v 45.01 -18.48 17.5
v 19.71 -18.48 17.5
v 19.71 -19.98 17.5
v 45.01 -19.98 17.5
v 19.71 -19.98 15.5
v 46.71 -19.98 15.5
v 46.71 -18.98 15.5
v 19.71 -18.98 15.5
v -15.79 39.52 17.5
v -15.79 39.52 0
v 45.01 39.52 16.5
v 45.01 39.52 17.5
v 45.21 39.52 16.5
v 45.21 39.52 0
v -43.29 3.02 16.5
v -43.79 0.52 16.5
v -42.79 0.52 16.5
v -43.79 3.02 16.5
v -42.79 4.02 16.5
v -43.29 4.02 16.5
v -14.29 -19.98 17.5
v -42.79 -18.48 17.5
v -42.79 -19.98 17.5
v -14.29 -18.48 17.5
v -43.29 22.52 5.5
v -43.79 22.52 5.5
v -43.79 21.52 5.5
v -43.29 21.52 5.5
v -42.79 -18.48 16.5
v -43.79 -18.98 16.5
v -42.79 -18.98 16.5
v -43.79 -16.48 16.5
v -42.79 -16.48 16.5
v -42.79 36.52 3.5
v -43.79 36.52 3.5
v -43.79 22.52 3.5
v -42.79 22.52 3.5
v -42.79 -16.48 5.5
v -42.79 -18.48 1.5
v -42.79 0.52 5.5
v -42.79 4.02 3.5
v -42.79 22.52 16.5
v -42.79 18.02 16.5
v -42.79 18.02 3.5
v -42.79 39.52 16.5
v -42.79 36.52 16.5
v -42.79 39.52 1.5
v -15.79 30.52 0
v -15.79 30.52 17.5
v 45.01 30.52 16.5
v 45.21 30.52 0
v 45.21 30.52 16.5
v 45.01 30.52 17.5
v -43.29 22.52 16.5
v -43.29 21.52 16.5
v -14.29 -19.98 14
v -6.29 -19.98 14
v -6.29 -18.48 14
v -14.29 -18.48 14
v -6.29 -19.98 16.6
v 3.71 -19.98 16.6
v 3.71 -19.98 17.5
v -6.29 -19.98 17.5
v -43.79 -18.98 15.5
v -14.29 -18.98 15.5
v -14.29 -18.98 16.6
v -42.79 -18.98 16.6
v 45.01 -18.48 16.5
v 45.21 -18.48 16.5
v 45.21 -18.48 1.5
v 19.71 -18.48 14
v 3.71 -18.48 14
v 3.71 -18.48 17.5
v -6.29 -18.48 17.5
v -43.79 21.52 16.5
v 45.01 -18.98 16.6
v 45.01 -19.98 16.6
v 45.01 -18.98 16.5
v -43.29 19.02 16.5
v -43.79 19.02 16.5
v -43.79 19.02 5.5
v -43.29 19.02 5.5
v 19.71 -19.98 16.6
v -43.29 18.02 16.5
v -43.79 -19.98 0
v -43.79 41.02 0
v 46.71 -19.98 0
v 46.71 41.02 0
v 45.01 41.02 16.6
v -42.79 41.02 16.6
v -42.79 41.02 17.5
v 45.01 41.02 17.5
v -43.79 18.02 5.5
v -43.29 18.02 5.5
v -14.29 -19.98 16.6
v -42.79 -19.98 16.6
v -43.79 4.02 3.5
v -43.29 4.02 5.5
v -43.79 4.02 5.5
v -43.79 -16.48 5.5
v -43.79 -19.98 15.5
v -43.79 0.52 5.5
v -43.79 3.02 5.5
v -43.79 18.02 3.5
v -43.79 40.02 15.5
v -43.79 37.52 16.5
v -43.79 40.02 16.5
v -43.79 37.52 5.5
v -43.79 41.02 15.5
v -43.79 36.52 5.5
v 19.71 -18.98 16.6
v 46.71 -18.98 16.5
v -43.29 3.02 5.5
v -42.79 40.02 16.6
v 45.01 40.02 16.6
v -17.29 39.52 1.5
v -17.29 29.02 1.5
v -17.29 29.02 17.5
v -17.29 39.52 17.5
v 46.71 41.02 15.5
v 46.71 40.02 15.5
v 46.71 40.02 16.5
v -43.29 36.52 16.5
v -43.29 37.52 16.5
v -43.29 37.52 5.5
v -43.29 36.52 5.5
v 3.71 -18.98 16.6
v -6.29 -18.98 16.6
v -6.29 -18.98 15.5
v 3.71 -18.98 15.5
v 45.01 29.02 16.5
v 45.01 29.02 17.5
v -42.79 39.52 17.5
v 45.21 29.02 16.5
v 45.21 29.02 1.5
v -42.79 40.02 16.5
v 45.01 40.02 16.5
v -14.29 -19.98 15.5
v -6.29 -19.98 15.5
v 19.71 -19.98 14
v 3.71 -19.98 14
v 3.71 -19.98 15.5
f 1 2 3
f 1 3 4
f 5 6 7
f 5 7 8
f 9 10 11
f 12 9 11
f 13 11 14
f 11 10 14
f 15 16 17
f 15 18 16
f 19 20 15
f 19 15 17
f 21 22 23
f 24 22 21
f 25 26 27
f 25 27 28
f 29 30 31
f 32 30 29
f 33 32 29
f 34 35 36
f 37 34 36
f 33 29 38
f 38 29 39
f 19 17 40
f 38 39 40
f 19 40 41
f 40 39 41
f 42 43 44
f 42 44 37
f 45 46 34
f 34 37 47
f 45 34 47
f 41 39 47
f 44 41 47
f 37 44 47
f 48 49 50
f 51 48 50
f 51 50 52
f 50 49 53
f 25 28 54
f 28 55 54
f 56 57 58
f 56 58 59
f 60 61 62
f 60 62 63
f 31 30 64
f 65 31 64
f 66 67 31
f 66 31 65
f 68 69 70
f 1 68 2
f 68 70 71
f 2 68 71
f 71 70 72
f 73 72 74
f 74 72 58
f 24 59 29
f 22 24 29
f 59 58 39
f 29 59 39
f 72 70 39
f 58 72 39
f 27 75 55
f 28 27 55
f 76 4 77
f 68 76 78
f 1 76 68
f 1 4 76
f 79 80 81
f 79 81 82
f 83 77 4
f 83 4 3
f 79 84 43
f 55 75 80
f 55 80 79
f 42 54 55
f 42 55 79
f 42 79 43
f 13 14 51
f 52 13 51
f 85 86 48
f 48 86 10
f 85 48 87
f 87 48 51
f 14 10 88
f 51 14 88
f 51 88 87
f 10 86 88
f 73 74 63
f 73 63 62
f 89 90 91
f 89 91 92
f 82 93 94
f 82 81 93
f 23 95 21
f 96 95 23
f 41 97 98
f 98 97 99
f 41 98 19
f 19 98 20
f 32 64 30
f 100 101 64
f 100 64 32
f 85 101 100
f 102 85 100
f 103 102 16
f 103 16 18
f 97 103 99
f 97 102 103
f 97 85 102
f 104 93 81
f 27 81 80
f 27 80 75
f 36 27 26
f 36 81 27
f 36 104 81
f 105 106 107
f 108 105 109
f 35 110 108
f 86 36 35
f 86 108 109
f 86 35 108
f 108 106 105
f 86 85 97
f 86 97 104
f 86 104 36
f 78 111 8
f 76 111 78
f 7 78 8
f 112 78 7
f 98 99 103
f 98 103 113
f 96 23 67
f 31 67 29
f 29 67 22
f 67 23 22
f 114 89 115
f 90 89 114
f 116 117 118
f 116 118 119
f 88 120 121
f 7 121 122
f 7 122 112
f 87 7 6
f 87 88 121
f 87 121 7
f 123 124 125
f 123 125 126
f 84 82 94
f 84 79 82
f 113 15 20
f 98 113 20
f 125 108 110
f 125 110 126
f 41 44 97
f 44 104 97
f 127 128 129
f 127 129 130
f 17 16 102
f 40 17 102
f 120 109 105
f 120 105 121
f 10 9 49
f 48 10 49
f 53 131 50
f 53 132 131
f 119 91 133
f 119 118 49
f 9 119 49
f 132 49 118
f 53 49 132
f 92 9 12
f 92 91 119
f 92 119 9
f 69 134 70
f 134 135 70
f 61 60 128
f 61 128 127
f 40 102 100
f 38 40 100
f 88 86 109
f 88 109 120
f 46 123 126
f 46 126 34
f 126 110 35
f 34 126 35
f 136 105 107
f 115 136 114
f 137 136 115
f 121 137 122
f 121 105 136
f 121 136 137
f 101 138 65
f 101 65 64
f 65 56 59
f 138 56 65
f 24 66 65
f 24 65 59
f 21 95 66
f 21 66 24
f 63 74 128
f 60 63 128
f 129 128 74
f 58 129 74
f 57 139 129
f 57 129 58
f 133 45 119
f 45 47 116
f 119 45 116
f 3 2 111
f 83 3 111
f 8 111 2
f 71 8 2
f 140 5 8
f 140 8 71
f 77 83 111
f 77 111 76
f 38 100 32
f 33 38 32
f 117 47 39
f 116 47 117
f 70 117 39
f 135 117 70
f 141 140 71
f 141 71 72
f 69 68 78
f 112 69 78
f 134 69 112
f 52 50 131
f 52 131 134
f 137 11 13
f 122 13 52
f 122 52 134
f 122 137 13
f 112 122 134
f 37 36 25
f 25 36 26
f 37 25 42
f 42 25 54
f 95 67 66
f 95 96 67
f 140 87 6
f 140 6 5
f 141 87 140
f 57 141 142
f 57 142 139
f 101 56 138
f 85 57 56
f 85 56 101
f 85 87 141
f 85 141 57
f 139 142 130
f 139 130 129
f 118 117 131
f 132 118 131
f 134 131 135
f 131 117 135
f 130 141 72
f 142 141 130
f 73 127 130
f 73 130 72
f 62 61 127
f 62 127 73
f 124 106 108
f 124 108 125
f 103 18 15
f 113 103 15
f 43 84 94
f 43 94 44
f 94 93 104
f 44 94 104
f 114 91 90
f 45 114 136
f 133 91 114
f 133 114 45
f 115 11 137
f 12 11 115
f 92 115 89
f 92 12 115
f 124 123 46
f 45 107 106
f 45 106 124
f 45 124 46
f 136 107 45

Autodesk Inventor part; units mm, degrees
ref_plane "YZ Plane" through (0, 0, 0) normal (1, 0, 0) x (0, 1, 0)
ref_plane "XZ Plane" through (0, 0, 0) normal (0, 1, 0) x (-1, 0, 0)
ref_plane "XY Plane" through (0, 0, 0) normal (0, 0, 1) x (1, 0, 0)
sketch "Sketch1" plane through (0, 0, 0) normal (0, 0, 1) x (1, 0, 0)
  line L0 (-43.7903, 41.0199) -> (46.7097, 41.0199)
  line L1 (46.7097, 41.0199) -> (46.7097, -19.9801)
  line L2 (46.7097, -19.9801) -> (-43.7903, -19.9801)
  line L3 (-43.7903, -19.9801) -> (-43.7903, 41.0199)
  point P0 (0, 0)
  dimension "d0" = 90.5
  dimension "d1" = 61
extrude "Extrusion1" add sketch "Sketch1" along normal blind 1.5
sketch "Sketch2" plane through (0, 0, 1.5) normal (0, 0, 1) x (1, 0, 0)
  line L0 (-42.7903, 39.5199) -> (45.2097, 39.5199)
  line L1 (45.2097, 39.5199) -> (45.2097, -18.4801)
  line L2 (45.2097, -18.4801) -> (-42.7903, -18.4801)
  line L3 (-42.7903, -18.4801) -> (-42.7903, 39.5199)
  line L4 (-43.7903, 41.0199) -> (46.7097, 41.0199)
  line L5 (46.7097, 41.0199) -> (46.7097, -19.9801)
  line L6 (46.7097, -19.9801) -> (-43.7903, -19.9801)
  line L7 (-43.7903, -19.9801) -> (-43.7903, 41.0199)
  point P0 (0, 0)
  dimension "d4" = 1.5
  dimension "d5" = 1.5
  dimension "d6" = 1.5
  dimension "d7" = 1
extrude "Extrusion2" add sketch "Sketch2" along normal blind 16
sketch "Sketch3" plane through (-43.7903, -19.9801, 0) normal (-1, 0, 0) x (0, 0, 1)
  line L0 (17.5, 1.5) -> (17.5, 59.5) projected
  line L1 (17.5, 20.5) -> (5.5, 20.5)
  line L2 (5.5, 20.5) -> (5.5, 3.5)
  line L3 (5.5, 3.5) -> (17.5, 3.5)
  line L4 (17.5, 3.5) -> (17.5, 20.5)
  line L5 (17.5, 38) -> (3.5, 38)
  line L6 (3.5, 38) -> (3.5, 24)
  line L7 (3.5, 24) -> (17.5, 24)
  line L8 (17.5, 24) -> (17.5, 38)
  line L9 (17.5, 56.5) -> (3.5, 56.5)
  line L10 (3.5, 56.5) -> (3.5, 42.5)
  line L11 (3.5, 42.5) -> (17.5, 42.5)
  line L12 (17.5, 42.5) -> (17.5, 56.5)
  line L13 (0, 0) -> (17.5, 0) projected
  point P0 (0, 19.9801)
  dimension "d10" = 3.5
  dimension "d11" = 12
  dimension "d12" = 17
  dimension "d13" = 3.5
  dimension "d14" = 14
  dimension "d15" = 14
  dimension "d16" = 14
  dimension "d17" = 4.5
  dimension "d18" = 14
extrude "Extrusion3" cut sketch "Sketch3" against normal blind 1
sketch "Sketch4" plane through (0, 0, 1.5) normal (0, 0, 1) x (1, 0, 0)
  line L0 (45.2097, 39.5199) -> (-15.7903, 39.5199)
  line L1 (-15.7903, 39.5199) -> (-15.7903, 30.5199)
  line L2 (-15.7903, 30.5199) -> (45.2097, 30.5199)
  line L3 (45.2097, 30.5199) -> (45.2097, 39.5199)
  point P0 (0, 0)
  dimension "d21" = 61
  dimension "d22" = 9
extrude "Extrusion4" cut sketch "Sketch4" against normal blind 1.5
sketch "Sketch5" plane through (0, 0, 1.5) normal (0, 0, 1) x (1, 0, 0)
  line L0 (45.2097, 30.5199) -> (-15.7903, 30.5199)
  line L1 (-15.7903, 30.5199) -> (-15.7903, 29.0199)
  line L2 (-15.7903, 29.0199) -> (45.2097, 29.0199)
  line L3 (45.2097, 29.0199) -> (45.2097, 30.5199)
  line L4 (-42.7903, 39.5199) -> (45.2097, 39.5199) projected
  line L5 (-15.7903, 29.0199) -> (-17.2903, 29.0199)
  line L6 (-17.2903, 29.0199) -> (-17.2903, 39.5199)
  line L7 (-17.2903, 39.5199) -> (-15.7903, 39.5199)
  line L8 (-15.7903, 39.5199) -> (-15.7903, 29.0199)
  line L9 (46.7097, 41.0199) -> (46.7097, -19.9801) projected
  line L10 (45.2097, -18.4801) -> (45.2097, 30.5199) projected
  point P0 (0, 0)
  dimension "d25" = 1.5
  dimension "d26" = 1.5
  dimension "d28" = 61
  dimension "d29" = 9
extrude "Extrusion5" add sketch "Sketch5" along normal blind 16
sketch "Sketch6" plane through (0, 0, 17.5) normal (0, 0, 1) x (1, 0, 0)
  line L0 (-43.7903, 0.5199) -> (-42.7903, 0.5199) projected
  line L1 (-42.7903, 4.0199) -> (-43.7903, 4.0199) projected
  line L2 (-42.7903, 0.5199) -> (-42.7903, 4.0199) projected
  line L3 (-43.7903, 4.0199) -> (-43.7903, 0.5199) projected
  line L4 (-43.7903, -19.9801) -> (-43.7903, 41.0199) projected
  line L5 (-43.2903, 4.0199) -> (-43.7903, 4.0199)
  line L6 (-43.7903, 4.0199) -> (-43.7903, 3.0199)
  line L7 (-43.7903, 3.0199) -> (-43.2903, 3.0199)
  line L8 (-43.2903, 3.0199) -> (-43.2903, 4.0199)
  point P0 (0, 0)
  dimension "d32" = 3.5
  dimension "d33" = 1
  dimension "d34" = 0.5
  dimension "d35" = 1
extrude "Extrusion6" cut sketch "Sketch6" against normal blind 12 contours L3 L1 L8 L7
sketch "Sketch7" plane through (0, 0, 17.5) normal (0, 0, 1) x (1, 0, 0)
  line L0 (-43.7903, 18.0199) -> (-42.7903, 18.0199) projected
  line L1 (-43.7903, 22.5199) -> (-43.7903, 18.0199) projected
  line L2 (-43.2903, 18.0199) -> (-43.7903, 18.0199)
  line L3 (-43.7903, 18.0199) -> (-43.7903, 19.0199)
  line L4 (-43.7903, 19.0199) -> (-43.2903, 19.0199)
  line L5 (-43.2903, 19.0199) -> (-43.2903, 18.0199)
  point P0 (0, 0)
  dimension "d38" = 1
extrude "Extrusion7" cut sketch "Sketch7" against normal blind 12
sketch "Sketch8" plane through (0, 0, 17.5) normal (0, 0, 1) x (1, 0, 0)
  line L0 (-43.7903, 22.5199) -> (-43.7903, 19.0199) projected
  line L1 (-43.2903, 22.5199) -> (-43.7903, 22.5199)
  line L2 (-43.7903, 22.5199) -> (-43.7903, 21.5199)
  line L3 (-43.7903, 21.5199) -> (-43.2903, 21.5199)
  line L4 (-43.2903, 21.5199) -> (-43.2903, 22.5199)
  line L5 (-42.7903, 22.5199) -> (-43.7903, 22.5199) projected
  point P0 (0, 0)
  dimension "d41" = 0.5
  dimension "d42" = 1
  dimension "d43" = 1
extrude "Extrusion8" cut sketch "Sketch8" against normal blind 12
sketch "Sketch9" plane through (0, 0, 17.5) normal (0, 0, 1) x (1, 0, 0)
  line L0 (-43.7903, 36.5199) -> (-42.7903, 36.5199) projected
  line L1 (-43.7903, 41.0199) -> (-43.7903, 36.5199) projected
  line L2 (-43.2903, 36.5199) -> (-43.7903, 36.5199)
  line L3 (-43.7903, 36.5199) -> (-43.7903, 37.5199)
  line L4 (-43.7903, 37.5199) -> (-43.2903, 37.5199)
  line L5 (-43.2903, 37.5199) -> (-43.2903, 36.5199)
  point P0 (0, 0)
  dimension "d46" = 1
  dimension "d47" = 0.5
extrude "Extrusion9" cut sketch "Sketch9" against normal blind 12
sketch "Sketch10" plane through (-43.7903, -19.9801, 0) normal (0, -1, 0) x (1, 0, 0)
  line L0 (29.5, 17.5) -> (37.5, 17.5)
  line L1 (37.5, 17.5) -> (37.5, 14)
  line L2 (37.5, 14) -> (29.5, 14)
  line L3 (29.5, 14) -> (29.5, 17.5)
  line L4 (0, 0) -> (0, 17.5) projected
  line L5 (47.5, 17.5) -> (63.5, 17.5)
  line L6 (63.5, 17.5) -> (63.5, 14)
  line L7 (63.5, 14) -> (47.5, 14)
  line L8 (47.5, 14) -> (47.5, 17.5)
  line L9 (90.5, 0) -> (90.5, 17.5) projected
  point P0 (43.7903, 0)
  dimension "d50" = 29.5
  dimension "d51" = 8
  dimension "d53" = 16
  dimension "d57" = 10
extrude "Extrusion10" cut sketch "Sketch10" against normal blind 1.5
sketch "Sketch11" plane through (-43.7903, -19.9801, 0) normal (0, -1, 0) x (1, 0, 0)
  line L0 (63.5, 17.5) -> (63.5, 14) projected
  line L1 (90.5, 0) -> (90.5, 17.5) projected
  line L2 (63.5, 16.6) -> (90.5, 16.6)
  line L3 (90.5, 16.6) -> (90.5, 15.5)
  line L4 (90.5, 15.5) -> (63.5, 15.5)
  line L5 (63.5, 15.5) -> (63.5, 16.6)
  line L6 (37.5, 17.5) -> (37.5, 14) projected
  line L7 (47.5, 14) -> (47.5, 17.5) projected
  line L8 (37.5, 16.6) -> (47.5, 16.6)
  line L9 (47.5, 16.6) -> (47.5, 15.5)
  line L10 (47.5, 15.5) -> (37.5, 15.5)
  line L11 (37.5, 15.5) -> (37.5, 16.6)
  line L12 (0, 0) -> (0, 17.5) projected
  line L13 (29.5, 14) -> (29.5, 17.5) projected
  line L14 (0, 16.6) -> (29.5, 16.6)
  line L15 (29.5, 16.6) -> (29.5, 15.5)
  line L16 (29.5, 15.5) -> (0, 15.5)
  line L17 (0, 15.5) -> (0, 16.6)
  line L18 (63.5, 17.5) -> (90.5, 17.5) projected
  line L19 (37.5, 17.5) -> (47.5, 17.5) projected
  line L20 (0, 17.5) -> (29.5, 17.5) projected
  point P0 (43.7903, 0)
  dimension "d61" = 1.1
  dimension "d62" = 0.9
  dimension "d63" = 1.1
  dimension "d64" = 0.9
  dimension "d65" = 1.1
  dimension "d66" = 0.9
extrude "Extrusion11" cut sketch "Sketch11" against normal blind 1 contours L2 L1 L4 L0 | L8 L7 L10 L6 | L12 L14 L13 L16
sketch "Sketch12" plane through (-43.7903, 41.0199, 0) normal (0, 1, 0) x (1, 0, 0)
  line L0 (90.5, 0) -> (90.5, -17.5) projected
  line L1 (0, 0) -> (0, -17.5) projected
  line L2 (90.5, -16.6) -> (0, -16.6)
  line L3 (0, -16.6) -> (0, -15.5)
  line L4 (0, -15.5) -> (90.5, -15.5)
  line L5 (90.5, -15.5) -> (90.5, -16.6)
  line L6 (90.5, -17.5) -> (0, -17.5) projected
  point P0 (43.7903, 0)
  dimension "d69" = 1.1
  dimension "d70" = 0.9
extrude "Extrusion12" cut sketch "Sketch12" against normal blind 1 contours L0 L2 L1 L4
sketch "Sketch13" plane through (0, 0, 17.5) normal (0, 0, 1) x (1, 0, 0)
  line L0 (-42.7903, -16.4801) -> (-43.7903, -16.4801)
  line L1 (-43.7903, -16.4801) -> (-43.7903, -19.9801)
  line L2 (-43.7903, -19.9801) -> (-42.7903, -19.9801)
  line L3 (-42.7903, -19.9801) -> (-42.7903, -16.4801)
  point P0 (0, 0)
extrude "Extrusion13" cut sketch "Sketch13" against normal blind 1
sketch "Sketch14" plane through (0, 0, 17.5) normal (0, 0, 1) x (1, 0, 0)
  line L0 (-42.7903, 4.0199) -> (-43.7903, 4.0199)
  line L1 (-43.7903, 4.0199) -> (-43.7903, 0.5199)
  line L2 (-43.7903, 0.5199) -> (-42.7903, 0.5199)
  line L3 (-42.7903, 0.5199) -> (-42.7903, 4.0199)
  point P0 (0, 0)
extrude "Extrusion14" cut sketch "Sketch14" against normal blind 1
sketch "Sketch15" plane through (0, 0, 17.5) normal (0, 0, 1) x (1, 0, 0)
  line L0 (-43.7903, 21.5199) -> (-43.7903, 19.0199) projected
  line L1 (-42.7903, 22.5199) -> (-43.7903, 22.5199)
  line L2 (-43.7903, 22.5199) -> (-43.7903, 20.2699)
  line L3 (-43.7903, 20.2699) -> (-42.7903, 20.2699)
  line L4 (-42.7903, 20.2699) -> (-42.7903, 22.5199)
  line L5 (-42.7903, 18.0199) -> (-43.7903, 18.0199)
  line L6 (-43.7903, 18.0199) -> (-43.7903, 20.2699)
  line L7 (-43.7903, 20.2699) -> (-42.7903, 20.2699)
  line L8 (-42.7903, 20.2699) -> (-42.7903, 18.0199)
  point P0 (0, 0)
extrude "Extrusion15" cut sketch "Sketch15" against normal blind 1
sketch "Sketch16" plane through (0, 0, 17.5) normal (0, 0, 1) x (1, 0, 0)
  line L0 (-43.7903, 41.0199) -> (-42.7903, 41.0199)
  line L1 (-42.7903, 41.0199) -> (-42.7903, 36.5199)
  line L2 (-42.7903, 36.5199) -> (-43.7903, 36.5199)
  line L3 (-43.7903, 36.5199) -> (-43.7903, 41.0199)
  point P0 (0, 0)
extrude "Extrusion16" cut sketch "Sketch16" against normal blind 1
sketch "Sketch17" plane through (0, 0, 17.5) normal (0, 0, 1) x (1, 0, 0)
  line L0 (46.7097, -19.9801) -> (45.0097, -19.9801)
  line L1 (45.0097, -19.9801) -> (45.0097, 41.0199)
  line L2 (45.0097, 41.0199) -> (46.7097, 41.0199)
  line L3 (46.7097, 41.0199) -> (46.7097, -19.9801)
  point P0 (0, 0)
  dimension "d81" = 61
  dimension "d84" = 1.7
extrude "Extrusion17" cut sketch "Sketch17" against normal blind 1
properties part number "raspi_enclosure2"
